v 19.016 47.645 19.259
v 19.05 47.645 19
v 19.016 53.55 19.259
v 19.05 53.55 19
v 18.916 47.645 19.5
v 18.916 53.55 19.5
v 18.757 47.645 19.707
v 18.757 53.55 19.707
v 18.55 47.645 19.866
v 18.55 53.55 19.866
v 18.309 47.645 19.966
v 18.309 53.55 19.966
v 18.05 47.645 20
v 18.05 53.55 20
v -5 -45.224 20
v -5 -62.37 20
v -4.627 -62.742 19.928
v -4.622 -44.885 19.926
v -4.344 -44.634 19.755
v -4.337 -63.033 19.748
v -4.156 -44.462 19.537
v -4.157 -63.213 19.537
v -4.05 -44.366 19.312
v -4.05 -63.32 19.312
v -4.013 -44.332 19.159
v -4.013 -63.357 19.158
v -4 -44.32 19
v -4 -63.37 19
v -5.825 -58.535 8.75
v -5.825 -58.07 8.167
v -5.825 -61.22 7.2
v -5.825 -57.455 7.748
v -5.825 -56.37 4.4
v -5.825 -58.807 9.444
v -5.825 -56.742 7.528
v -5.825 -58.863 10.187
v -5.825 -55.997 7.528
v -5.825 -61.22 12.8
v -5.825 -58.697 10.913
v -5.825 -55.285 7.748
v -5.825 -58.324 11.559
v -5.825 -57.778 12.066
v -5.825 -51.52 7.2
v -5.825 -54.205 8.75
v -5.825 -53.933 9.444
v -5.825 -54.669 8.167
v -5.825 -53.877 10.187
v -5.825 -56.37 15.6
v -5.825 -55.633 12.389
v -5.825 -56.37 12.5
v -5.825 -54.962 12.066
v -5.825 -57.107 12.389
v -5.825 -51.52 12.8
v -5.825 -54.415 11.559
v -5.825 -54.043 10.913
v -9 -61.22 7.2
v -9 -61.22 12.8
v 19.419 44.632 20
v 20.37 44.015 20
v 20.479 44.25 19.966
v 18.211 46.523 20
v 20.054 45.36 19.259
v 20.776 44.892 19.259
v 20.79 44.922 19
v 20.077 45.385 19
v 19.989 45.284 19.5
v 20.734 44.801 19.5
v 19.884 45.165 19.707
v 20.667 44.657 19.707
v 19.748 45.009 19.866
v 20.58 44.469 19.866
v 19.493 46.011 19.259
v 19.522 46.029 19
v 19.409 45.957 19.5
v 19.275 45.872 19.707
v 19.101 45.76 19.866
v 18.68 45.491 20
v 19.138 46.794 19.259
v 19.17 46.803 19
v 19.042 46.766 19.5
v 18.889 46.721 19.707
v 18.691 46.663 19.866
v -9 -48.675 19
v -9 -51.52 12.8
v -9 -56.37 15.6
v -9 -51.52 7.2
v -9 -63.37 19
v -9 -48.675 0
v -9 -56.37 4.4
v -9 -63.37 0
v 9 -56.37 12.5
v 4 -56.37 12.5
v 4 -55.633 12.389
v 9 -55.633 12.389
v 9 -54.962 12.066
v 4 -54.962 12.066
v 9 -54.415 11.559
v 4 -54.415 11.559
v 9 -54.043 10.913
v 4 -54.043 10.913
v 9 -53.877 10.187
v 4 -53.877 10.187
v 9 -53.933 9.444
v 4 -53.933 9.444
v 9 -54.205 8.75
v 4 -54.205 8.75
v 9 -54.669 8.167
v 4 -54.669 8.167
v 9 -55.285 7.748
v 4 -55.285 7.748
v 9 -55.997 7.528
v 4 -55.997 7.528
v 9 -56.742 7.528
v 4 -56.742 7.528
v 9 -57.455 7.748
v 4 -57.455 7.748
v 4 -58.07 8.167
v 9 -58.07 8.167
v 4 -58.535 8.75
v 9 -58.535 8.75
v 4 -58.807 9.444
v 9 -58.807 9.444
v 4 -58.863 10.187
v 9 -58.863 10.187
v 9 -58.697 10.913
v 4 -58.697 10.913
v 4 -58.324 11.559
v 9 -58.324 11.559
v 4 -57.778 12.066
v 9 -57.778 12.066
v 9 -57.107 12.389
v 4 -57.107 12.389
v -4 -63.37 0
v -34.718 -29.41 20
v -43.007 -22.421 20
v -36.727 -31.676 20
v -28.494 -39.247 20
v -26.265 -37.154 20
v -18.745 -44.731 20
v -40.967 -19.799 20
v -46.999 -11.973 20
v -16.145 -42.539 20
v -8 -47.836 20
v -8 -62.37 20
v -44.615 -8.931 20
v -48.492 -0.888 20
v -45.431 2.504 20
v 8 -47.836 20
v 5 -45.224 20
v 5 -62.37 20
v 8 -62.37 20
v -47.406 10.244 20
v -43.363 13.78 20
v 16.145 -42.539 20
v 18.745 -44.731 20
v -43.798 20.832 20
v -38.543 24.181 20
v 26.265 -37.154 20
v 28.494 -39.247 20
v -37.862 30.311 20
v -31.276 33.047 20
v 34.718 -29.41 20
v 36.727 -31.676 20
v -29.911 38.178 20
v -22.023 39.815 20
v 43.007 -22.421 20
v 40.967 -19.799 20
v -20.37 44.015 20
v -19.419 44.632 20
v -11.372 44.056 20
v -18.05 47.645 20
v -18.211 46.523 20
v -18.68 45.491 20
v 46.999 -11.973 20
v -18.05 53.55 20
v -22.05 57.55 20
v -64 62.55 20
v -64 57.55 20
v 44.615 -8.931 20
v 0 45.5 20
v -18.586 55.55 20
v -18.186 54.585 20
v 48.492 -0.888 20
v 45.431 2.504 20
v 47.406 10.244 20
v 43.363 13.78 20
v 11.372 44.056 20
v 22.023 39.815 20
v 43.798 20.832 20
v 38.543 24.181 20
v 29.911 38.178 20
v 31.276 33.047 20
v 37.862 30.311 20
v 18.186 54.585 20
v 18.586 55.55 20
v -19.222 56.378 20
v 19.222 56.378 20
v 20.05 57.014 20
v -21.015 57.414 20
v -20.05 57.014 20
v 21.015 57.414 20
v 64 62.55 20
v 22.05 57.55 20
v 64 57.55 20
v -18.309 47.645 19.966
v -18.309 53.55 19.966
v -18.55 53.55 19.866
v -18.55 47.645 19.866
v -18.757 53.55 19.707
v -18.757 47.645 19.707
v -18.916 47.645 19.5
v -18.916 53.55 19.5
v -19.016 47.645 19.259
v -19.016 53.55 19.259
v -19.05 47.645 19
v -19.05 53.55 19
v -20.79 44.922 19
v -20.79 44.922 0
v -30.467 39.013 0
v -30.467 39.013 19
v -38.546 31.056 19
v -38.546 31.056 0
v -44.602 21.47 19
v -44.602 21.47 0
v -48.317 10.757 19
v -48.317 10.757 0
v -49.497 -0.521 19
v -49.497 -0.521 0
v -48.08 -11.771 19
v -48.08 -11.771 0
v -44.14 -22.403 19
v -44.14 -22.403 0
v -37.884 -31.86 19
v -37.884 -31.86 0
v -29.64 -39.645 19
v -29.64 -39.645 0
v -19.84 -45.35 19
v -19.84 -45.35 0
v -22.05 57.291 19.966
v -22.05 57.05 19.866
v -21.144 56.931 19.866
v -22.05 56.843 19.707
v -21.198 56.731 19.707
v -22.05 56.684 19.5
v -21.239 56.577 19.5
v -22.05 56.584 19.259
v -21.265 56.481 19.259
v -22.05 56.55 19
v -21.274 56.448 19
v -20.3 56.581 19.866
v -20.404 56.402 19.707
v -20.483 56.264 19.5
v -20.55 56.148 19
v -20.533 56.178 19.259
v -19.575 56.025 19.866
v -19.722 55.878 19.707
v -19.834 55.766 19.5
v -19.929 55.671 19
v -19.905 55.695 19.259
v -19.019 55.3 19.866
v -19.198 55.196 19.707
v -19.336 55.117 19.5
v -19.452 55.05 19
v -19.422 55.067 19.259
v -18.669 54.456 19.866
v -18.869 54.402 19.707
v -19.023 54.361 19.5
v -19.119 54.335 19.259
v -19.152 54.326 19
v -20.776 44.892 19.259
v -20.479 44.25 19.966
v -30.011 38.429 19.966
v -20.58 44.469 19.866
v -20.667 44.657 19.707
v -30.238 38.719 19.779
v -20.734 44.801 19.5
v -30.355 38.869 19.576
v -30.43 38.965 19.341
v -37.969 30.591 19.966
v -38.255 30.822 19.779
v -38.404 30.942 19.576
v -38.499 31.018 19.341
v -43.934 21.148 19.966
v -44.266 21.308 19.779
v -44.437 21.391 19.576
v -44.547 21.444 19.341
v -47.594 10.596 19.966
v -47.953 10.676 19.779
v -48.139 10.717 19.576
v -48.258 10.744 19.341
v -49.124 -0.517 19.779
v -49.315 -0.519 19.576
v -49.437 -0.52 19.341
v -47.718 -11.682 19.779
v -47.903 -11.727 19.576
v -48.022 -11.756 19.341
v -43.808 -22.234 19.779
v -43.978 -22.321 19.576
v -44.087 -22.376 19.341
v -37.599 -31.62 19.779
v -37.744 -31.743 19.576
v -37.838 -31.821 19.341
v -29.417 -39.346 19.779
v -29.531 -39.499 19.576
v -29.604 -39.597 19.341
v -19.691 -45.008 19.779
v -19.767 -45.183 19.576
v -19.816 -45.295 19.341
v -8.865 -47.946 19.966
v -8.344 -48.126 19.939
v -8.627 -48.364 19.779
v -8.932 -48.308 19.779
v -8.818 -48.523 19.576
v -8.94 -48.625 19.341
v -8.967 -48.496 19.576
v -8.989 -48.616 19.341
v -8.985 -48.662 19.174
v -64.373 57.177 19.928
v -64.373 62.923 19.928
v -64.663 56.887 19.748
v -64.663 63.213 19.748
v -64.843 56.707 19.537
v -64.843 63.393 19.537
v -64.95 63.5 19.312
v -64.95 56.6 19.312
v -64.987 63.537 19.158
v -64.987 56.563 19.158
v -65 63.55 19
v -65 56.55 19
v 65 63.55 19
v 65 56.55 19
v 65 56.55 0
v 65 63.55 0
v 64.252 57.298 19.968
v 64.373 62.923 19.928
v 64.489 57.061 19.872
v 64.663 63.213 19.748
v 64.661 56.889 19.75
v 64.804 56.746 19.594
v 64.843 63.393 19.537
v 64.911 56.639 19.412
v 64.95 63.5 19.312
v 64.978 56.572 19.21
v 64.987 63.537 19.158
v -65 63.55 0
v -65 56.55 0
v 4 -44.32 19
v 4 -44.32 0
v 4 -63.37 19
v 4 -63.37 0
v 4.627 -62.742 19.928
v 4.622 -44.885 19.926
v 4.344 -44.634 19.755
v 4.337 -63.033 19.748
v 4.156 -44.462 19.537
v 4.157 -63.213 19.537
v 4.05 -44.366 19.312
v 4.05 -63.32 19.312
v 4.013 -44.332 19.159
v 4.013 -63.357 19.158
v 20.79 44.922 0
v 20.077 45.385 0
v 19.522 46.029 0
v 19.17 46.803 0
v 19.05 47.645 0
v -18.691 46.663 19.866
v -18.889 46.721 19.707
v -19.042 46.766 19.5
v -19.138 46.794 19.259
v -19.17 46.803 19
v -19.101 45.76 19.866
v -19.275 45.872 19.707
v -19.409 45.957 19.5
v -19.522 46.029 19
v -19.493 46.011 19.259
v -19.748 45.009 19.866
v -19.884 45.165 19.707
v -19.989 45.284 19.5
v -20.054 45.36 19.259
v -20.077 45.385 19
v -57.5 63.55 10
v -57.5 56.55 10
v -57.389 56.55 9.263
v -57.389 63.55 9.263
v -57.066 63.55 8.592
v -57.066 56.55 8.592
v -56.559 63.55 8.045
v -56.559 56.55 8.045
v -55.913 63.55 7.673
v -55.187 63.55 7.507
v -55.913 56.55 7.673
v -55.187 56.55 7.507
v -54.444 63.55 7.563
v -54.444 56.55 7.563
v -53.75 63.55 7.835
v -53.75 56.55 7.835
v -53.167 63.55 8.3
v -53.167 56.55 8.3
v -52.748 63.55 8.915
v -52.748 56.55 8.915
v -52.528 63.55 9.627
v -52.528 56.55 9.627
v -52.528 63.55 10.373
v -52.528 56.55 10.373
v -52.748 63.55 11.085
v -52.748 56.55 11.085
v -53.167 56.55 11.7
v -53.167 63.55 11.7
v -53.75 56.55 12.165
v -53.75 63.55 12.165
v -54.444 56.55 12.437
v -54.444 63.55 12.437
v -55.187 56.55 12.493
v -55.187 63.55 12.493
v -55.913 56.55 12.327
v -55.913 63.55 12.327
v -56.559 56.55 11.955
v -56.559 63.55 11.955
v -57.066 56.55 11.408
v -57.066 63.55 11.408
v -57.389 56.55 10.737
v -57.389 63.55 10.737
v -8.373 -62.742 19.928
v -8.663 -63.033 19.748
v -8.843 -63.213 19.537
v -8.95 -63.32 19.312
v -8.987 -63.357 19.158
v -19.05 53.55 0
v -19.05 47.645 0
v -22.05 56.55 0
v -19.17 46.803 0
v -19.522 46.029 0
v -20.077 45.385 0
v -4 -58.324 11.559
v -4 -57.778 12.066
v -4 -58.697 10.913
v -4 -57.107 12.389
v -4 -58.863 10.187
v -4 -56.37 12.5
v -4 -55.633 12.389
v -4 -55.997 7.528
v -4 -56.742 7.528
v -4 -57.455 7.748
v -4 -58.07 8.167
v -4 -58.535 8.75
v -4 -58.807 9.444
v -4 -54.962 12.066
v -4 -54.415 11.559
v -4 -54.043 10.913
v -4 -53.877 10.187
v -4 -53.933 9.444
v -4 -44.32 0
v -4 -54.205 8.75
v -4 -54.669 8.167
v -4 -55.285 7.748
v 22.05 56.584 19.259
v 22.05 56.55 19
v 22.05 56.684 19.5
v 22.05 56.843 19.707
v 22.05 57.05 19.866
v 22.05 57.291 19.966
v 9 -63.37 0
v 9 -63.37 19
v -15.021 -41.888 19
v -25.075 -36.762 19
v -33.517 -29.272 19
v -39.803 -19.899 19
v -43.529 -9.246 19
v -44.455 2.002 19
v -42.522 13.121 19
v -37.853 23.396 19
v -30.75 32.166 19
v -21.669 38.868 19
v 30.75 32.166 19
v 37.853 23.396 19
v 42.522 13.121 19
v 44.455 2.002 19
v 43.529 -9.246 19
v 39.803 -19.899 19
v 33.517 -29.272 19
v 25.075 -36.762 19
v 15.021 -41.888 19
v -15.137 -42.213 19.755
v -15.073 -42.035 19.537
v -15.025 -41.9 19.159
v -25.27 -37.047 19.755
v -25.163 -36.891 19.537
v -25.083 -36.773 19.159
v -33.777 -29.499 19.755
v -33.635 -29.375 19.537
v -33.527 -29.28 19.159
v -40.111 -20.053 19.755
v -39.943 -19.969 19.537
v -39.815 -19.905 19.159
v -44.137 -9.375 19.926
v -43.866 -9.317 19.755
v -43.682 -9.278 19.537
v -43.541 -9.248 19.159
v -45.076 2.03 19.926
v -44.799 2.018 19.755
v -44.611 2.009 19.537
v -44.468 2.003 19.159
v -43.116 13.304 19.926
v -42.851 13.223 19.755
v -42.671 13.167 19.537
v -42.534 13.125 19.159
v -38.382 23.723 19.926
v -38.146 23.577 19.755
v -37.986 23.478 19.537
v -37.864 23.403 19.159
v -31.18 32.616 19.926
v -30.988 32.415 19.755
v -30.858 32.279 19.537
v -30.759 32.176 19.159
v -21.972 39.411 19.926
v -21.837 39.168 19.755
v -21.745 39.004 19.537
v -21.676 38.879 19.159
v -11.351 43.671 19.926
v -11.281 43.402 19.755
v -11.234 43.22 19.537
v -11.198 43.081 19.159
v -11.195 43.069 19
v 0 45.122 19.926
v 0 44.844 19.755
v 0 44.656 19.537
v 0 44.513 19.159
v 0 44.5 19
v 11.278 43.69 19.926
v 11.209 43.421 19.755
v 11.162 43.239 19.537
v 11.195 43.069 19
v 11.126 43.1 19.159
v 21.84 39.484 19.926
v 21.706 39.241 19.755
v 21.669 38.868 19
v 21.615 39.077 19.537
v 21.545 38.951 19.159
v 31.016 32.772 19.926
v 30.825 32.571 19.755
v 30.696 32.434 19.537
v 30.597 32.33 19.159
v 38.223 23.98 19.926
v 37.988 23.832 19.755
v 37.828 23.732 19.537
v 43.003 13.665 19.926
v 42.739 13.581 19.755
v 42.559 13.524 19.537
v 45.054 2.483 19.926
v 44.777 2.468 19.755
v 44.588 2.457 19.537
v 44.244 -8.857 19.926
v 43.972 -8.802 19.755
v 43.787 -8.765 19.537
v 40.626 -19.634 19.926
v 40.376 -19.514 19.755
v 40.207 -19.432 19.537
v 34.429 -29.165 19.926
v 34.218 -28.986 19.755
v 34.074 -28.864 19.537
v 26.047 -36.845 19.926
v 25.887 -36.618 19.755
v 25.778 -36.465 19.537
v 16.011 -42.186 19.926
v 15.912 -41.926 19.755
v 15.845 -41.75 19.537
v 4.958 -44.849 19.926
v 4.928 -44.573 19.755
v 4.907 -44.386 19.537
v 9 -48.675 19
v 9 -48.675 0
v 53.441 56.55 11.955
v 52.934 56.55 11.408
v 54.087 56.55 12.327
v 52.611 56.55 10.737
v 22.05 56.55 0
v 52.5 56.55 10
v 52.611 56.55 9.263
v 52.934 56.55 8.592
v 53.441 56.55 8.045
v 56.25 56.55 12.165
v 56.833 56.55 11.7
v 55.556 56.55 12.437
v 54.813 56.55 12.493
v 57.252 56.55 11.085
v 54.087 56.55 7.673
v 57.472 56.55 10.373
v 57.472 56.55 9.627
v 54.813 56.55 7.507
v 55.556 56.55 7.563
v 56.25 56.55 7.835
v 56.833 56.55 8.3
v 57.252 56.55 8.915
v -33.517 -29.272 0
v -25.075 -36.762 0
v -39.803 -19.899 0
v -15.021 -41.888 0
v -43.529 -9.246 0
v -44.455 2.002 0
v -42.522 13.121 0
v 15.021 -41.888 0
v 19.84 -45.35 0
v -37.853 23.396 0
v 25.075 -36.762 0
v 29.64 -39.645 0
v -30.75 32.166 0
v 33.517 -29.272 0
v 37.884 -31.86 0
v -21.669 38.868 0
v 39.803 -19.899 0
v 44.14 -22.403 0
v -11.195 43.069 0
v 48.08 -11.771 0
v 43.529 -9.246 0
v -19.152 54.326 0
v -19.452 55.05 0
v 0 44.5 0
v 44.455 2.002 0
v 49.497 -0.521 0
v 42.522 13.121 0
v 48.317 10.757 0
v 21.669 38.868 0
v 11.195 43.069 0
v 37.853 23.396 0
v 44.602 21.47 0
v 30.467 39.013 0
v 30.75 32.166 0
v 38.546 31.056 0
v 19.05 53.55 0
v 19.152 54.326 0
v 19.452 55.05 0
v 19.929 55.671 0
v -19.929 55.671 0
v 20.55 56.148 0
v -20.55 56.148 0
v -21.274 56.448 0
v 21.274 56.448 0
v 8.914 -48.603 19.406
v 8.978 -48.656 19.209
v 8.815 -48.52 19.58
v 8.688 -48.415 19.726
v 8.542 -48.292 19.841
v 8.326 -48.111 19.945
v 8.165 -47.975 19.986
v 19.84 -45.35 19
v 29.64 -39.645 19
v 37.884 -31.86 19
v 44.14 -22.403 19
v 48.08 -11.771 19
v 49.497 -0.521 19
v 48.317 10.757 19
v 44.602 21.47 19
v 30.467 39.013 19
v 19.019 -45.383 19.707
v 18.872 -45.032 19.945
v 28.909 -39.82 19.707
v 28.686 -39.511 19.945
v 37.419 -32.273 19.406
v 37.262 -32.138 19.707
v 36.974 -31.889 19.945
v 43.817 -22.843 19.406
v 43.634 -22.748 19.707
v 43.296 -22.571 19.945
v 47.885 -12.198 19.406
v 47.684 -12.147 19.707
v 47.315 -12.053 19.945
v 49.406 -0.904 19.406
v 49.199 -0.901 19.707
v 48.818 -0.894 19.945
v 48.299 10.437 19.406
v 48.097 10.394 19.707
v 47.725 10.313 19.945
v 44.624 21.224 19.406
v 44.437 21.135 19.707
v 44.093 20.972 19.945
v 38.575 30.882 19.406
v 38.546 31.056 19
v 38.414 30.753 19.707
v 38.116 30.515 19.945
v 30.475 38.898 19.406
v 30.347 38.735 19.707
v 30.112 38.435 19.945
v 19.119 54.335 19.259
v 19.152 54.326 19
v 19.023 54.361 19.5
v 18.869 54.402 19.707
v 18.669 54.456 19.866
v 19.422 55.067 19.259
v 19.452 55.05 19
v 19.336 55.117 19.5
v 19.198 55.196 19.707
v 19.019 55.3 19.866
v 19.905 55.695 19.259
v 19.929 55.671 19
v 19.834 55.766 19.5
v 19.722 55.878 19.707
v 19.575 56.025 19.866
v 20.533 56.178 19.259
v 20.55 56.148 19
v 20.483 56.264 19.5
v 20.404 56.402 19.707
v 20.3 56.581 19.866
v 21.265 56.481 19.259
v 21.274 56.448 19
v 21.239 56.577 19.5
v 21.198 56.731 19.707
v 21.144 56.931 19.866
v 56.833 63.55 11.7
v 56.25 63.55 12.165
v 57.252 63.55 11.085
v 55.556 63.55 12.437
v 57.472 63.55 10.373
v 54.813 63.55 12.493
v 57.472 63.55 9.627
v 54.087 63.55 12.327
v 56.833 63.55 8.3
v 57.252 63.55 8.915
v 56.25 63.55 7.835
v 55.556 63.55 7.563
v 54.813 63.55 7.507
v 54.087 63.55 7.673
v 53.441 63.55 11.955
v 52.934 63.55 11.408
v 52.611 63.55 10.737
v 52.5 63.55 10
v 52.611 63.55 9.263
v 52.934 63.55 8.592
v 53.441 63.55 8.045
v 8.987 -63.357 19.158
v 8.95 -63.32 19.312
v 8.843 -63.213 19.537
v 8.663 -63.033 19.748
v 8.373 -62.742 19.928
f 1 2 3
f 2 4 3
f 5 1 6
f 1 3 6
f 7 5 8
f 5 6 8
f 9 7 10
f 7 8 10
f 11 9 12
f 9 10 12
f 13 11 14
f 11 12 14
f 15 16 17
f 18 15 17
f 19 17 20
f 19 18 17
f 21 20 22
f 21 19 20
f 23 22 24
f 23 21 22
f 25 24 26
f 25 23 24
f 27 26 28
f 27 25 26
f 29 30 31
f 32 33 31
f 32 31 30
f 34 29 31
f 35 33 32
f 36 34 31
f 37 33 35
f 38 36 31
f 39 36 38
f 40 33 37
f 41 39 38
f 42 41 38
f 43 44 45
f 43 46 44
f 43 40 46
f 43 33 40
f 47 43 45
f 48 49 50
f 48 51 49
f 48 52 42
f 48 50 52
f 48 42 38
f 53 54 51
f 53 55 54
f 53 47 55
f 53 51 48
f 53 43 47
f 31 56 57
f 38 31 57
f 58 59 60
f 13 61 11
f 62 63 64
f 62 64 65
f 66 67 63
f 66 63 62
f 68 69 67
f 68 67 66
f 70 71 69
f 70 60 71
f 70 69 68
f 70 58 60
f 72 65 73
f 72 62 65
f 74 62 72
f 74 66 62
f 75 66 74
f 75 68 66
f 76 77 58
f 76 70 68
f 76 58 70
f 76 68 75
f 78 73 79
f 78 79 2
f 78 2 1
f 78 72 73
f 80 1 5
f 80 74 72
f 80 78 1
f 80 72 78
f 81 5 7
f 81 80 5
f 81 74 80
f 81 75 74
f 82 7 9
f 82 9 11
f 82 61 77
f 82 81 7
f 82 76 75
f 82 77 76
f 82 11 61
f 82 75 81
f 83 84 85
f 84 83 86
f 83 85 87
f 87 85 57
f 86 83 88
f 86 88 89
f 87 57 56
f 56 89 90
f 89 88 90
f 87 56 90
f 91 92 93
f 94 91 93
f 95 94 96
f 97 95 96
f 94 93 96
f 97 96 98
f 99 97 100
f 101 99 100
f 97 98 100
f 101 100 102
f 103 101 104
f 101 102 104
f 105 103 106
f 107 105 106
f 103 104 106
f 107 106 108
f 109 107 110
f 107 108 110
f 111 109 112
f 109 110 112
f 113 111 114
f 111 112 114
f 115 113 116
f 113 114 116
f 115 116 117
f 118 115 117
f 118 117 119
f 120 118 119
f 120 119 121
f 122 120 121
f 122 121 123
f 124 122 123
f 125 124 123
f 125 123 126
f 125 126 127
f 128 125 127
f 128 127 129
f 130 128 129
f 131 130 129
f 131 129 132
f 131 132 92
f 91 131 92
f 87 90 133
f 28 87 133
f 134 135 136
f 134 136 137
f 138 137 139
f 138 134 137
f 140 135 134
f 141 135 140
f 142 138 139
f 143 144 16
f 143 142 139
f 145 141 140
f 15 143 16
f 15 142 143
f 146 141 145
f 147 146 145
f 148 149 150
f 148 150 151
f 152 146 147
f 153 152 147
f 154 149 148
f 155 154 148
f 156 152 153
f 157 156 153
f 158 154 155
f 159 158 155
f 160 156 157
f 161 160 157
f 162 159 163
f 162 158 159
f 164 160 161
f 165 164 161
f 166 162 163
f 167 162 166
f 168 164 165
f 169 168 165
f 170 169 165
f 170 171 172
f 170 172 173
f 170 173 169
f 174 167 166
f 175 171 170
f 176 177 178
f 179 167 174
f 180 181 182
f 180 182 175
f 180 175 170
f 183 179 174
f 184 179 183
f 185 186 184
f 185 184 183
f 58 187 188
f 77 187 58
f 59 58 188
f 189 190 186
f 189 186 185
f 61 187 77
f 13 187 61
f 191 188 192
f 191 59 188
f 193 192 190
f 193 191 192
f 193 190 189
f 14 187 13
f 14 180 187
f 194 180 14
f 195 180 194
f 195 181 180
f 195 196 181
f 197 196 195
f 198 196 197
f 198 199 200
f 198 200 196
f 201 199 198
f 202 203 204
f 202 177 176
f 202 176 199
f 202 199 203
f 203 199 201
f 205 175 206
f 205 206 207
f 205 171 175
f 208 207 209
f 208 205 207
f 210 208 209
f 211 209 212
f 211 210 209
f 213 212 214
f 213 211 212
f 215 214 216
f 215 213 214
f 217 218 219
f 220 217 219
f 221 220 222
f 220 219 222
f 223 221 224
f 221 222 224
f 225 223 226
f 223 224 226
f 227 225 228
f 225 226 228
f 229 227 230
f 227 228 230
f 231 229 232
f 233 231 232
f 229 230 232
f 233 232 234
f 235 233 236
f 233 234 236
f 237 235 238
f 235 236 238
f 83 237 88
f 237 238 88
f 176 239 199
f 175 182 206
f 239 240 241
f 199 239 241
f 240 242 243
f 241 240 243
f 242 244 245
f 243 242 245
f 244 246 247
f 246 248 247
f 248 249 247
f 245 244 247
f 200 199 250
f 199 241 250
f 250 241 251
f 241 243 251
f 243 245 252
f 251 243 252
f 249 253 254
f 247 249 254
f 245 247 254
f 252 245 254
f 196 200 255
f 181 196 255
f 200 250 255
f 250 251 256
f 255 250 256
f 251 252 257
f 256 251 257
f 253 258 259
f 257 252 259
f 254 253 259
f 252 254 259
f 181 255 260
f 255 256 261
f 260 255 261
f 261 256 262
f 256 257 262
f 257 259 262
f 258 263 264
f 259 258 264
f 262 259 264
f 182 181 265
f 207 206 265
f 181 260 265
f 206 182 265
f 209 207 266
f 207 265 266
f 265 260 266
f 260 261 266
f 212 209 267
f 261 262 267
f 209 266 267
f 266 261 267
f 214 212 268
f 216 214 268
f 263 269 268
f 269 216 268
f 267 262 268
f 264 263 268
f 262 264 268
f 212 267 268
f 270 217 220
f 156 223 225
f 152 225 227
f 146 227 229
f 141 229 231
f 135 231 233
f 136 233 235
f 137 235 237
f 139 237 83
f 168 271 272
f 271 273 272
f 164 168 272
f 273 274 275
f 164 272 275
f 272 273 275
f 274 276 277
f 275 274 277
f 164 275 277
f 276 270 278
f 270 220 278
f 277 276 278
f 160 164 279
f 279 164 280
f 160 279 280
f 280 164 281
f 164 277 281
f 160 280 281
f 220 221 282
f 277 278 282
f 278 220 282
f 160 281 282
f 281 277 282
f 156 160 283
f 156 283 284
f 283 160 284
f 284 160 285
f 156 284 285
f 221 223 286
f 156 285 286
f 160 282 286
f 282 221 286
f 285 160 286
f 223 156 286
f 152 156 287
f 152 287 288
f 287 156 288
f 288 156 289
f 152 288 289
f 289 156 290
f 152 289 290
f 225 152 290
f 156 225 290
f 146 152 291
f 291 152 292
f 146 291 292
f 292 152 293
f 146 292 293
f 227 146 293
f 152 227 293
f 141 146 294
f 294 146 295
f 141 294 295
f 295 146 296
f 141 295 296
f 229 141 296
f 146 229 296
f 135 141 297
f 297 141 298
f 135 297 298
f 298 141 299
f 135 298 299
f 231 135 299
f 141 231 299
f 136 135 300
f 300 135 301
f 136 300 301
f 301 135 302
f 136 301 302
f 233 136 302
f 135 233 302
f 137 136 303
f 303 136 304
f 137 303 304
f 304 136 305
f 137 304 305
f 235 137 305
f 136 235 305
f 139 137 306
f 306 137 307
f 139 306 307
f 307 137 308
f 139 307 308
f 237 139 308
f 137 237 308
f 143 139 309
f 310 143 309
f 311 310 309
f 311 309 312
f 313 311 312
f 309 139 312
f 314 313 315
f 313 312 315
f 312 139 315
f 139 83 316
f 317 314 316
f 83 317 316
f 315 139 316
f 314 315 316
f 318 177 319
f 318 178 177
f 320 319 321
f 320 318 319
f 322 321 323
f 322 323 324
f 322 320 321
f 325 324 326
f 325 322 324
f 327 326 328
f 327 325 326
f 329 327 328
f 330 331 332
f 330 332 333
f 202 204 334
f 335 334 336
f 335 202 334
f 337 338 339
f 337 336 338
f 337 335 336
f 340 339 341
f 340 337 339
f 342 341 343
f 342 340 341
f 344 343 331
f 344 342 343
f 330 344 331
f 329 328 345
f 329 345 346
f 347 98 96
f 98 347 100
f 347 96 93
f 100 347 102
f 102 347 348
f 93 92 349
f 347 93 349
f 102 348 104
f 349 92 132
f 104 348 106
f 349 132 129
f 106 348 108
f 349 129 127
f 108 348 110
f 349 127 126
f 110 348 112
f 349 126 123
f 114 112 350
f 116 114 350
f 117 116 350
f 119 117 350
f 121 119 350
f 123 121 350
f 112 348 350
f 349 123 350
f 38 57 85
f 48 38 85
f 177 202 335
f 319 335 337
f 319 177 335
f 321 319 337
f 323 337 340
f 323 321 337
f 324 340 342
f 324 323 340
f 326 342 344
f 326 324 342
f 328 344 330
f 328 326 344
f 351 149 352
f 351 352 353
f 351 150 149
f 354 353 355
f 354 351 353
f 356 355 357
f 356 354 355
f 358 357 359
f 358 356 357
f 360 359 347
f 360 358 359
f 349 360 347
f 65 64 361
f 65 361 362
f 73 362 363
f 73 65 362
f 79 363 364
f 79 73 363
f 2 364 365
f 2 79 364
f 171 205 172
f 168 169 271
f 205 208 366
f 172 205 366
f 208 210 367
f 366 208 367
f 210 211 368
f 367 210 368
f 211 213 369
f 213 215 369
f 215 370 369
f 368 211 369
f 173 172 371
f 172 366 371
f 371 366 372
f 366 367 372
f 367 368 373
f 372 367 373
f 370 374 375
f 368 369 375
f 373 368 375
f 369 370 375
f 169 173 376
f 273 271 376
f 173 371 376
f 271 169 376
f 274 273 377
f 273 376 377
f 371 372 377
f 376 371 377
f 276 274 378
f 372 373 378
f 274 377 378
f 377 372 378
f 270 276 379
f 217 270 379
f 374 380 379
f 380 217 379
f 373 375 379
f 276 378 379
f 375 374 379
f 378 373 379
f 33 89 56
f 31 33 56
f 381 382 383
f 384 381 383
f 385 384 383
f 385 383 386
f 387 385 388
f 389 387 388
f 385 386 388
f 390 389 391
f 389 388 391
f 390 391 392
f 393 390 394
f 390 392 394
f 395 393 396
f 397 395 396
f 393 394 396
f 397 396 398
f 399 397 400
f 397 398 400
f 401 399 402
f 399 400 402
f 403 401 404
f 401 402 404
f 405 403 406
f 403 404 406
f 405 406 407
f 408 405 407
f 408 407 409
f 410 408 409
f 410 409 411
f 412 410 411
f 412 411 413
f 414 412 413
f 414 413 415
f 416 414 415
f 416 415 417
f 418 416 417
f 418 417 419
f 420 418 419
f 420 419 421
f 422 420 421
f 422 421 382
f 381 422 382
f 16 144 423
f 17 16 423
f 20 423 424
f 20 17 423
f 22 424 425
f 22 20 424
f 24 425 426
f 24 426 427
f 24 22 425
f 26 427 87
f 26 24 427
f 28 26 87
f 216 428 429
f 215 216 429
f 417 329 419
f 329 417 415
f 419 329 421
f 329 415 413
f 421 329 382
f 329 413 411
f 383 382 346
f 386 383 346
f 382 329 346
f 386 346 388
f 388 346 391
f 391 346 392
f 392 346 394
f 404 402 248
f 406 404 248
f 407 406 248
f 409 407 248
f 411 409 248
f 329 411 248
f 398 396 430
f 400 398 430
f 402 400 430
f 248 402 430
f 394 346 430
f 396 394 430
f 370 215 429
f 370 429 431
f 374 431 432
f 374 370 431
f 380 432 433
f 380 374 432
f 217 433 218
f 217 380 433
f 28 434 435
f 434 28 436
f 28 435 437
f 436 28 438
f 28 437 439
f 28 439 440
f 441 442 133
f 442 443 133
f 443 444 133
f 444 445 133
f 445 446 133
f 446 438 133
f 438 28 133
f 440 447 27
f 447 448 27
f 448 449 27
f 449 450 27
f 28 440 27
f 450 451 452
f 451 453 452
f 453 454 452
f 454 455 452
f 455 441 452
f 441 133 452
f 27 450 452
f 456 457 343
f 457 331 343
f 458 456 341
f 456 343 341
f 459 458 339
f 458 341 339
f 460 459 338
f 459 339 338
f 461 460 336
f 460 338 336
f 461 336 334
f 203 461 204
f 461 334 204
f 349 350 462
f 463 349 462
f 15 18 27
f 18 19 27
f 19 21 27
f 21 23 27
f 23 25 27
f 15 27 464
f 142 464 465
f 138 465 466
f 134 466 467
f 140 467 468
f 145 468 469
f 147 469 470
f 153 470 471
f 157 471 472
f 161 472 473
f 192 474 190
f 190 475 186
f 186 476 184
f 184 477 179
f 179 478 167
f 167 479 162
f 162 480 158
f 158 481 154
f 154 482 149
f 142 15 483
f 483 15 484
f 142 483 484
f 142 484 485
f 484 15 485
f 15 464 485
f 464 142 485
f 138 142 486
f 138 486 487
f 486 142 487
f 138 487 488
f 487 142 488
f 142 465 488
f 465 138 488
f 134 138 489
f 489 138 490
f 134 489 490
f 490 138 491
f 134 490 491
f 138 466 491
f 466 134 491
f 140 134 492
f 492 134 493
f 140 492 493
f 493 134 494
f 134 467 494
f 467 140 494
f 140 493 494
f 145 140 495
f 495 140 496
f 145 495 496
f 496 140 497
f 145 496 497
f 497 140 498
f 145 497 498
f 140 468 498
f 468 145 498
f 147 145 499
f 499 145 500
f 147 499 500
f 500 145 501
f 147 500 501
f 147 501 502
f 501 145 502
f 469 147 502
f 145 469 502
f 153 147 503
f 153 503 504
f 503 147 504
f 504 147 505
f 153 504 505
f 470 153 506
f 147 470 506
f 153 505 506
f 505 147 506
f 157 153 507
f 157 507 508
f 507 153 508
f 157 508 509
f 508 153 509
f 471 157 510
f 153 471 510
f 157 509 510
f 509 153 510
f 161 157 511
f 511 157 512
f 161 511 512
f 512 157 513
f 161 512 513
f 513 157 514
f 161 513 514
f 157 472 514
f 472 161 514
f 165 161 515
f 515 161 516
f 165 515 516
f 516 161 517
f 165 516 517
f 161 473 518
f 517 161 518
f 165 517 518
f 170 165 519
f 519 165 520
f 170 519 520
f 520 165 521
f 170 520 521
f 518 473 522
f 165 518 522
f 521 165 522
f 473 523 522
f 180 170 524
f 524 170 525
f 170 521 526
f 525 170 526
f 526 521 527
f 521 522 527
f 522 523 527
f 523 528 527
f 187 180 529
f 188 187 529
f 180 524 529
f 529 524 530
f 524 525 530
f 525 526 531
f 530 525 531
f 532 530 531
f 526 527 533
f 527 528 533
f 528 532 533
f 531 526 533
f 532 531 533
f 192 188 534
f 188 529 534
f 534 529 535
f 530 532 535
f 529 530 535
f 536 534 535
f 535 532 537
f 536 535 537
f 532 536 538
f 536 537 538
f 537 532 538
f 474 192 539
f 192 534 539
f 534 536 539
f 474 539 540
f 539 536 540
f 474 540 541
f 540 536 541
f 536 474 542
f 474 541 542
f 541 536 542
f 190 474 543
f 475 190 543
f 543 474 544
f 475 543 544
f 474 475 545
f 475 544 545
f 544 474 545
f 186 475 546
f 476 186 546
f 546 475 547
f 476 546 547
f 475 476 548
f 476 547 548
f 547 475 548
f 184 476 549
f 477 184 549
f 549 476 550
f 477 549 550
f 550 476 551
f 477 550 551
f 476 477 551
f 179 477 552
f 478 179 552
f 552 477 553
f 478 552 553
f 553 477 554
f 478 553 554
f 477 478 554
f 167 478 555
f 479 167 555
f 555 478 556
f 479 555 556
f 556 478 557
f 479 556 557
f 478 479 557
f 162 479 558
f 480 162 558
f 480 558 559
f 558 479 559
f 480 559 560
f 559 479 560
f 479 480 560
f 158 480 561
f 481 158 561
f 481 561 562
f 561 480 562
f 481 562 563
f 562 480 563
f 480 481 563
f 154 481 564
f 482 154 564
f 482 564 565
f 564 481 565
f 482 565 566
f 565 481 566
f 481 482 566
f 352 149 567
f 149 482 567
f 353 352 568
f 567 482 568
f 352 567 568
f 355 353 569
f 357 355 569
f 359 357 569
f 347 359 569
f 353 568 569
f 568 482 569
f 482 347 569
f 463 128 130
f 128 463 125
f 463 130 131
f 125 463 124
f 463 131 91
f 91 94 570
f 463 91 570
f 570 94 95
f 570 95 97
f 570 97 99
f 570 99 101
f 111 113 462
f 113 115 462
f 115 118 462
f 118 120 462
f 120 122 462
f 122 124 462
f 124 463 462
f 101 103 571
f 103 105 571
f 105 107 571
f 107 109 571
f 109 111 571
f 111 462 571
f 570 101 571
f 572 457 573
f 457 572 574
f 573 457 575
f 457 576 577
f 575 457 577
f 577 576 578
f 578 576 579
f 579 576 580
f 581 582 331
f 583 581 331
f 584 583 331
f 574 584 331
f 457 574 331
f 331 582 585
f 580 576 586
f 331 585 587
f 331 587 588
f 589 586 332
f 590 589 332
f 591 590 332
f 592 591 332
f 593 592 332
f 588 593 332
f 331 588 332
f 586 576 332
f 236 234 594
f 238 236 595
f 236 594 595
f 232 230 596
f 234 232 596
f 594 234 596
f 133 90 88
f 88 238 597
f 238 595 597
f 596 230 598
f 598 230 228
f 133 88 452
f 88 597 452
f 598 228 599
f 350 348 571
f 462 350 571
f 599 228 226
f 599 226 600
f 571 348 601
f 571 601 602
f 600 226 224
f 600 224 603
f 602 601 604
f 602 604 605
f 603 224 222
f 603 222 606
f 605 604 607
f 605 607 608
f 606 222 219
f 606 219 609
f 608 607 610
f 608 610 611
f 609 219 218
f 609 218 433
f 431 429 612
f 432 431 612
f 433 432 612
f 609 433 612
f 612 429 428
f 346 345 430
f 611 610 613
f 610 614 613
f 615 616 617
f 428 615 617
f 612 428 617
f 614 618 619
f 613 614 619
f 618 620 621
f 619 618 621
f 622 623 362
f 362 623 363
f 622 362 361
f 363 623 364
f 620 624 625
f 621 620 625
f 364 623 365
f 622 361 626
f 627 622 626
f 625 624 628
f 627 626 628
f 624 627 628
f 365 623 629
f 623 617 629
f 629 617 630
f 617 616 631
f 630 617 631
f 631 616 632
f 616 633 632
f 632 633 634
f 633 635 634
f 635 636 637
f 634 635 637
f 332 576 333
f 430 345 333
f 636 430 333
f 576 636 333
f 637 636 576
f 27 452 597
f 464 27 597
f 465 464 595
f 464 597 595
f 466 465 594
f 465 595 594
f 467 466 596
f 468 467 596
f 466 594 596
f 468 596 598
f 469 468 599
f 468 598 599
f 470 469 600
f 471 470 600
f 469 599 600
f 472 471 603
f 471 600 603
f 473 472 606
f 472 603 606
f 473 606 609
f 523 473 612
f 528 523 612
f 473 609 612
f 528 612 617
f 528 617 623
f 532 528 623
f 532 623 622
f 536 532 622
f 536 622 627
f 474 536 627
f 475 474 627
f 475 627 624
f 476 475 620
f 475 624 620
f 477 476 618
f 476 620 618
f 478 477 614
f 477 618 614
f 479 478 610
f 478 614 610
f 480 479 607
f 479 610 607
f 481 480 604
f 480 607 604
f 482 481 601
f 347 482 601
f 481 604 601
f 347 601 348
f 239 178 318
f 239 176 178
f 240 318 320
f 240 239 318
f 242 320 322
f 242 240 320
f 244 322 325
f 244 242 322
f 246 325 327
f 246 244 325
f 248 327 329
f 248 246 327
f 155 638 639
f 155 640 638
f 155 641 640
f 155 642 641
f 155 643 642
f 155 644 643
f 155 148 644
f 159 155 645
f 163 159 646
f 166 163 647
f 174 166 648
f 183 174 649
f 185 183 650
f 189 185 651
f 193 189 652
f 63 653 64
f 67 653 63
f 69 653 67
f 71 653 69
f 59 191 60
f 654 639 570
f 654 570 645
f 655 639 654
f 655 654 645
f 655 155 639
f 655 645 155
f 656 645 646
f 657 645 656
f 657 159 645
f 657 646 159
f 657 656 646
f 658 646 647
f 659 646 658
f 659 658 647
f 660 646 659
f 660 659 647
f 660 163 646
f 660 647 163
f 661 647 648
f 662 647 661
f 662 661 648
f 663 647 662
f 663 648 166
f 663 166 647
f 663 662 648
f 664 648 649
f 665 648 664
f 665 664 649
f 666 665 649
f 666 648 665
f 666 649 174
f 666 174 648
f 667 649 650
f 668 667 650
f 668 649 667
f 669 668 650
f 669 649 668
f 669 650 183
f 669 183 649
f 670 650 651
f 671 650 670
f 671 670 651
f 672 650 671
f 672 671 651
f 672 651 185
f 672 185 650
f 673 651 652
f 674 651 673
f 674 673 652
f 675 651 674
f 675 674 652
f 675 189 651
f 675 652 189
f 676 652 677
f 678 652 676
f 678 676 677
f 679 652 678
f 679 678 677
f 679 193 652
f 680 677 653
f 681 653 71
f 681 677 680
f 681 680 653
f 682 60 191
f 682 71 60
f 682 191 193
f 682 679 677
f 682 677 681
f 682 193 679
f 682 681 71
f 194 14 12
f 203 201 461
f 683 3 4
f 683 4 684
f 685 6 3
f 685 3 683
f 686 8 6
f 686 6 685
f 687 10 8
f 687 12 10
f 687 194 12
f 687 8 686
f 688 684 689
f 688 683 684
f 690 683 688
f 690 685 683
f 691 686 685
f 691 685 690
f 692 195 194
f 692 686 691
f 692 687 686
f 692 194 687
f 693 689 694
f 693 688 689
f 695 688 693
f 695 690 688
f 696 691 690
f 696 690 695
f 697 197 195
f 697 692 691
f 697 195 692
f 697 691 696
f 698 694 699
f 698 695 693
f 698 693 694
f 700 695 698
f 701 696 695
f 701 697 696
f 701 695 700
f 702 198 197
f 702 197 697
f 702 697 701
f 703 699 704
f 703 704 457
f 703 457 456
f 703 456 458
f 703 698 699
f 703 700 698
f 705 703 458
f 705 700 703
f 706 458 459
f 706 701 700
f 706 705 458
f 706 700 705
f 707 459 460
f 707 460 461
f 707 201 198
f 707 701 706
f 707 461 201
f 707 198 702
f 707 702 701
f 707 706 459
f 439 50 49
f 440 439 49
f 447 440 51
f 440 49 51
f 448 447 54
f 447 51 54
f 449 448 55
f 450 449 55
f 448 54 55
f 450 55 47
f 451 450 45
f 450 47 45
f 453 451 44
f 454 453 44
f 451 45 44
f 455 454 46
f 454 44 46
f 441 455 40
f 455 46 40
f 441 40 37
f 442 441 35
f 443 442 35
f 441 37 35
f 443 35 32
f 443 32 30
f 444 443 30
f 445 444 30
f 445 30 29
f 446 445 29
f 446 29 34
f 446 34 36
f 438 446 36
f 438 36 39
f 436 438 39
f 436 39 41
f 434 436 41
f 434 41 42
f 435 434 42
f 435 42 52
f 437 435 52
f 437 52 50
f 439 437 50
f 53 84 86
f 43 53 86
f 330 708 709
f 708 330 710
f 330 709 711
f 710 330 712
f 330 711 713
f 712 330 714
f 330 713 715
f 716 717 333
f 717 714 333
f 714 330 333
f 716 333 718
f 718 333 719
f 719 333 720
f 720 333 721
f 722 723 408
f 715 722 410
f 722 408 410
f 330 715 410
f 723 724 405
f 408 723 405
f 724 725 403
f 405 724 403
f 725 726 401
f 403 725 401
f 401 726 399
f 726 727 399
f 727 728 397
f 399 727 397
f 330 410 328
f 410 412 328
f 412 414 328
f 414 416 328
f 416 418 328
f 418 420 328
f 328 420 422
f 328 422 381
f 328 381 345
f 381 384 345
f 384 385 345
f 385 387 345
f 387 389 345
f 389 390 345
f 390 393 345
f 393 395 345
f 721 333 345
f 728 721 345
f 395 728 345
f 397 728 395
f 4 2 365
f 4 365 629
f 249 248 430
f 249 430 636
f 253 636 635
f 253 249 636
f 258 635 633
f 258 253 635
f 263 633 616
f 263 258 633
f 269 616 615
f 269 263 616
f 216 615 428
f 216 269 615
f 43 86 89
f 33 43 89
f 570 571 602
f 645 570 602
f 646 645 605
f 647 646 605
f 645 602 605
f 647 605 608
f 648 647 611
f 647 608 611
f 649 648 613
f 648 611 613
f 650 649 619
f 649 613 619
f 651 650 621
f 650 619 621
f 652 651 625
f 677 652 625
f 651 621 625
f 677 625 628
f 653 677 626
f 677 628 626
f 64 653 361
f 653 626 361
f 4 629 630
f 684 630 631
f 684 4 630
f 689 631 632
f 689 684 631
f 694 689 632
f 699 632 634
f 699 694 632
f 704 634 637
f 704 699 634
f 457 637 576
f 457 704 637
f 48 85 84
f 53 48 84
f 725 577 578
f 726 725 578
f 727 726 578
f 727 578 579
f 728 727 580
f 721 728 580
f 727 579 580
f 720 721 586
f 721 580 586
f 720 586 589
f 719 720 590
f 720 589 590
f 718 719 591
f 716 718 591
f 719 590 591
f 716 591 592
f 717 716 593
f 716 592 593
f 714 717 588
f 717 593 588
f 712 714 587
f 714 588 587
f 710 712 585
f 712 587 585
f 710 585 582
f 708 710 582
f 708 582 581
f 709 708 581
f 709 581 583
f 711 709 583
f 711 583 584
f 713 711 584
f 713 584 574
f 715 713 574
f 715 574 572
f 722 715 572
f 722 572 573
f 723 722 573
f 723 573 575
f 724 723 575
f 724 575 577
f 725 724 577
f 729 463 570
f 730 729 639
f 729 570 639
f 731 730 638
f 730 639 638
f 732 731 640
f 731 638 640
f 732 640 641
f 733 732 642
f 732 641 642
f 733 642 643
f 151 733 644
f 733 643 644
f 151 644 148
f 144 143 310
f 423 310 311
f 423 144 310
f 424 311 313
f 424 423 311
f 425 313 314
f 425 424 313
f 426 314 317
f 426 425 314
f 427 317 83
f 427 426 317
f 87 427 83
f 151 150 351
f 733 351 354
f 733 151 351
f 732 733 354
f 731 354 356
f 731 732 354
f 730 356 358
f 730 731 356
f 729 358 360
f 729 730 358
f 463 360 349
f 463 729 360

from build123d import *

# Parameters (mm, degrees)
BOSS_EXTRUDE1_DEPTH = 20
FILLET1_R           = 3
SKETCH2_R           = 2.5
CUT_EXTRUDE1_DEPTH  = 8
SKETCH3_R           = 2.5
CUT_EXTRUDE2_DEPTH  = 75
SKETCH3_4_R         = 2.5
CUT_EXTRUDE3_DEPTH  = 3.175
FILLET2_R           = 1


with BuildPart() as part:
    # Sketch1 → Boss-Extrude1 (new body)
    with BuildSketch(Plane.XY):
        with BuildLine():
            Line((4, -44.319860108), (4, -63.369860108))
            Line((4, -63.369860108), (9, -63.369860108))
            Line((9, -63.369860108), (9, -48.674942219))
            ThreePointArc((9, -48.674942219), (49.221622989, -5.242311542), (19.05, 45.68749829))
            Line((19.05, 45.68749829), (19.05, 56.55))
            Line((19.05, 56.55), (65, 56.55))
            Line((65, 56.55), (65, 63.55))
            Line((65, 63.55), (-65, 63.55))
            Line((-65, 63.55), (-65, 56.55))
            Line((-65, 56.55), (-19.05, 56.55))
            Line((-19.05, 56.55), (-19.05, 45.68749829))
            ThreePointArc((-19.05, 45.68749829), (-49.221622989, -5.242311542), (-9, -48.674942219))
            Line((-9, -48.674942219), (-9, -63.369860108))
            Line((-9, -63.369860108), (-4, -63.369860108))
            Line((-4, -63.369860108), (-4, -44.319860108))
            ThreePointArc((-4, -44.319860108), (0, 44.5), (4, -44.319860108))
        make_face()
    extrude(amount=BOSS_EXTRUDE1_DEPTH)

    # Fillet1
    fillet1_edges = [part.edges().sort_by_distance(p)[0] for p in [
        (-19.05, 56.55, 10),
        (19.05, 56.55, 10),
        (19.05, 45.68749829, 10),
        (-19.05, 45.68749829, 10),
    ]]
    fillet(fillet1_edges, radius=FILLET1_R)

    # Sketch2 → Cut-Extrude1 (cut, through all)
    with BuildSketch(Plane(origin=(0, 56.55, 0), x_dir=(-1, 0, 0), z_dir=(0, -1, 0))):
        with Locations((55, -10)):
            Circle(SKETCH2_R)
        with Locations((-55, -10)):
            Circle(SKETCH2_R)
    extrude(amount=-CUT_EXTRUDE1_DEPTH, mode=Mode.SUBTRACT)

    # Sketch3 → Cut-Extrude2 (cut, through all)
    with BuildSketch(Plane.ZY.offset(9)):
        with Locations((10, -56.369860108)):
            Circle(SKETCH3_R)
    extrude(amount=-CUT_EXTRUDE2_DEPTH, mode=Mode.SUBTRACT)

    # Sketch3<4> → Cut-Extrude3 (cut)
    with BuildSketch(Plane.ZY.offset(9)):
        Polygon((15.600297611, -56.369860108), (12.800148806, -51.519860108), (7.199851194, -51.519860108), (4.399702389, -56.369860108), (7.199851194, -61.219860108), (12.800148806, -61.219860108), align=None)
        with Locations((10, -56.369860108)):
            Circle(SKETCH3_4_R, mode=Mode.SUBTRACT)
    extrude(amount=-CUT_EXTRUDE3_DEPTH, mode=Mode.SUBTRACT)

    # Fillet2
    fillet2_edges = [part.edges().sort_by_distance(p)[0] for p in [
        (-9, -56.022401163, 20),
        (-6.5, -63.369860108, 20),
        (-4, -53.844860108, 20),
        (0, 44.5, 20),
        (4, -53.844860108, 20),
        (6.5, -63.369860108, 20),
        (9, -56.022401163, 20),
        (49.1118994, -6.186383215, 20),
        (19.05, 50.59750774, 20),
        (43.525, 56.55, 20),
        (-49.1118994, -6.186383215, 20),
        (65, 60.05, 20),
        (-19.05, 50.59750774, 20),
        (19.522155068, 46.029466037, 20),
        (0, 63.55, 20),
        (19.928679656, 55.671320344, 20),
        (-19.522155068, 46.029466037, 20),
        (-19.928679656, 55.671320344, 20),
        (-65, 60.05, 20),
        (-43.525, 56.55, 20),
    ]]
    fillet(fillet2_edges, radius=FILLET2_R)


solid = part.part
